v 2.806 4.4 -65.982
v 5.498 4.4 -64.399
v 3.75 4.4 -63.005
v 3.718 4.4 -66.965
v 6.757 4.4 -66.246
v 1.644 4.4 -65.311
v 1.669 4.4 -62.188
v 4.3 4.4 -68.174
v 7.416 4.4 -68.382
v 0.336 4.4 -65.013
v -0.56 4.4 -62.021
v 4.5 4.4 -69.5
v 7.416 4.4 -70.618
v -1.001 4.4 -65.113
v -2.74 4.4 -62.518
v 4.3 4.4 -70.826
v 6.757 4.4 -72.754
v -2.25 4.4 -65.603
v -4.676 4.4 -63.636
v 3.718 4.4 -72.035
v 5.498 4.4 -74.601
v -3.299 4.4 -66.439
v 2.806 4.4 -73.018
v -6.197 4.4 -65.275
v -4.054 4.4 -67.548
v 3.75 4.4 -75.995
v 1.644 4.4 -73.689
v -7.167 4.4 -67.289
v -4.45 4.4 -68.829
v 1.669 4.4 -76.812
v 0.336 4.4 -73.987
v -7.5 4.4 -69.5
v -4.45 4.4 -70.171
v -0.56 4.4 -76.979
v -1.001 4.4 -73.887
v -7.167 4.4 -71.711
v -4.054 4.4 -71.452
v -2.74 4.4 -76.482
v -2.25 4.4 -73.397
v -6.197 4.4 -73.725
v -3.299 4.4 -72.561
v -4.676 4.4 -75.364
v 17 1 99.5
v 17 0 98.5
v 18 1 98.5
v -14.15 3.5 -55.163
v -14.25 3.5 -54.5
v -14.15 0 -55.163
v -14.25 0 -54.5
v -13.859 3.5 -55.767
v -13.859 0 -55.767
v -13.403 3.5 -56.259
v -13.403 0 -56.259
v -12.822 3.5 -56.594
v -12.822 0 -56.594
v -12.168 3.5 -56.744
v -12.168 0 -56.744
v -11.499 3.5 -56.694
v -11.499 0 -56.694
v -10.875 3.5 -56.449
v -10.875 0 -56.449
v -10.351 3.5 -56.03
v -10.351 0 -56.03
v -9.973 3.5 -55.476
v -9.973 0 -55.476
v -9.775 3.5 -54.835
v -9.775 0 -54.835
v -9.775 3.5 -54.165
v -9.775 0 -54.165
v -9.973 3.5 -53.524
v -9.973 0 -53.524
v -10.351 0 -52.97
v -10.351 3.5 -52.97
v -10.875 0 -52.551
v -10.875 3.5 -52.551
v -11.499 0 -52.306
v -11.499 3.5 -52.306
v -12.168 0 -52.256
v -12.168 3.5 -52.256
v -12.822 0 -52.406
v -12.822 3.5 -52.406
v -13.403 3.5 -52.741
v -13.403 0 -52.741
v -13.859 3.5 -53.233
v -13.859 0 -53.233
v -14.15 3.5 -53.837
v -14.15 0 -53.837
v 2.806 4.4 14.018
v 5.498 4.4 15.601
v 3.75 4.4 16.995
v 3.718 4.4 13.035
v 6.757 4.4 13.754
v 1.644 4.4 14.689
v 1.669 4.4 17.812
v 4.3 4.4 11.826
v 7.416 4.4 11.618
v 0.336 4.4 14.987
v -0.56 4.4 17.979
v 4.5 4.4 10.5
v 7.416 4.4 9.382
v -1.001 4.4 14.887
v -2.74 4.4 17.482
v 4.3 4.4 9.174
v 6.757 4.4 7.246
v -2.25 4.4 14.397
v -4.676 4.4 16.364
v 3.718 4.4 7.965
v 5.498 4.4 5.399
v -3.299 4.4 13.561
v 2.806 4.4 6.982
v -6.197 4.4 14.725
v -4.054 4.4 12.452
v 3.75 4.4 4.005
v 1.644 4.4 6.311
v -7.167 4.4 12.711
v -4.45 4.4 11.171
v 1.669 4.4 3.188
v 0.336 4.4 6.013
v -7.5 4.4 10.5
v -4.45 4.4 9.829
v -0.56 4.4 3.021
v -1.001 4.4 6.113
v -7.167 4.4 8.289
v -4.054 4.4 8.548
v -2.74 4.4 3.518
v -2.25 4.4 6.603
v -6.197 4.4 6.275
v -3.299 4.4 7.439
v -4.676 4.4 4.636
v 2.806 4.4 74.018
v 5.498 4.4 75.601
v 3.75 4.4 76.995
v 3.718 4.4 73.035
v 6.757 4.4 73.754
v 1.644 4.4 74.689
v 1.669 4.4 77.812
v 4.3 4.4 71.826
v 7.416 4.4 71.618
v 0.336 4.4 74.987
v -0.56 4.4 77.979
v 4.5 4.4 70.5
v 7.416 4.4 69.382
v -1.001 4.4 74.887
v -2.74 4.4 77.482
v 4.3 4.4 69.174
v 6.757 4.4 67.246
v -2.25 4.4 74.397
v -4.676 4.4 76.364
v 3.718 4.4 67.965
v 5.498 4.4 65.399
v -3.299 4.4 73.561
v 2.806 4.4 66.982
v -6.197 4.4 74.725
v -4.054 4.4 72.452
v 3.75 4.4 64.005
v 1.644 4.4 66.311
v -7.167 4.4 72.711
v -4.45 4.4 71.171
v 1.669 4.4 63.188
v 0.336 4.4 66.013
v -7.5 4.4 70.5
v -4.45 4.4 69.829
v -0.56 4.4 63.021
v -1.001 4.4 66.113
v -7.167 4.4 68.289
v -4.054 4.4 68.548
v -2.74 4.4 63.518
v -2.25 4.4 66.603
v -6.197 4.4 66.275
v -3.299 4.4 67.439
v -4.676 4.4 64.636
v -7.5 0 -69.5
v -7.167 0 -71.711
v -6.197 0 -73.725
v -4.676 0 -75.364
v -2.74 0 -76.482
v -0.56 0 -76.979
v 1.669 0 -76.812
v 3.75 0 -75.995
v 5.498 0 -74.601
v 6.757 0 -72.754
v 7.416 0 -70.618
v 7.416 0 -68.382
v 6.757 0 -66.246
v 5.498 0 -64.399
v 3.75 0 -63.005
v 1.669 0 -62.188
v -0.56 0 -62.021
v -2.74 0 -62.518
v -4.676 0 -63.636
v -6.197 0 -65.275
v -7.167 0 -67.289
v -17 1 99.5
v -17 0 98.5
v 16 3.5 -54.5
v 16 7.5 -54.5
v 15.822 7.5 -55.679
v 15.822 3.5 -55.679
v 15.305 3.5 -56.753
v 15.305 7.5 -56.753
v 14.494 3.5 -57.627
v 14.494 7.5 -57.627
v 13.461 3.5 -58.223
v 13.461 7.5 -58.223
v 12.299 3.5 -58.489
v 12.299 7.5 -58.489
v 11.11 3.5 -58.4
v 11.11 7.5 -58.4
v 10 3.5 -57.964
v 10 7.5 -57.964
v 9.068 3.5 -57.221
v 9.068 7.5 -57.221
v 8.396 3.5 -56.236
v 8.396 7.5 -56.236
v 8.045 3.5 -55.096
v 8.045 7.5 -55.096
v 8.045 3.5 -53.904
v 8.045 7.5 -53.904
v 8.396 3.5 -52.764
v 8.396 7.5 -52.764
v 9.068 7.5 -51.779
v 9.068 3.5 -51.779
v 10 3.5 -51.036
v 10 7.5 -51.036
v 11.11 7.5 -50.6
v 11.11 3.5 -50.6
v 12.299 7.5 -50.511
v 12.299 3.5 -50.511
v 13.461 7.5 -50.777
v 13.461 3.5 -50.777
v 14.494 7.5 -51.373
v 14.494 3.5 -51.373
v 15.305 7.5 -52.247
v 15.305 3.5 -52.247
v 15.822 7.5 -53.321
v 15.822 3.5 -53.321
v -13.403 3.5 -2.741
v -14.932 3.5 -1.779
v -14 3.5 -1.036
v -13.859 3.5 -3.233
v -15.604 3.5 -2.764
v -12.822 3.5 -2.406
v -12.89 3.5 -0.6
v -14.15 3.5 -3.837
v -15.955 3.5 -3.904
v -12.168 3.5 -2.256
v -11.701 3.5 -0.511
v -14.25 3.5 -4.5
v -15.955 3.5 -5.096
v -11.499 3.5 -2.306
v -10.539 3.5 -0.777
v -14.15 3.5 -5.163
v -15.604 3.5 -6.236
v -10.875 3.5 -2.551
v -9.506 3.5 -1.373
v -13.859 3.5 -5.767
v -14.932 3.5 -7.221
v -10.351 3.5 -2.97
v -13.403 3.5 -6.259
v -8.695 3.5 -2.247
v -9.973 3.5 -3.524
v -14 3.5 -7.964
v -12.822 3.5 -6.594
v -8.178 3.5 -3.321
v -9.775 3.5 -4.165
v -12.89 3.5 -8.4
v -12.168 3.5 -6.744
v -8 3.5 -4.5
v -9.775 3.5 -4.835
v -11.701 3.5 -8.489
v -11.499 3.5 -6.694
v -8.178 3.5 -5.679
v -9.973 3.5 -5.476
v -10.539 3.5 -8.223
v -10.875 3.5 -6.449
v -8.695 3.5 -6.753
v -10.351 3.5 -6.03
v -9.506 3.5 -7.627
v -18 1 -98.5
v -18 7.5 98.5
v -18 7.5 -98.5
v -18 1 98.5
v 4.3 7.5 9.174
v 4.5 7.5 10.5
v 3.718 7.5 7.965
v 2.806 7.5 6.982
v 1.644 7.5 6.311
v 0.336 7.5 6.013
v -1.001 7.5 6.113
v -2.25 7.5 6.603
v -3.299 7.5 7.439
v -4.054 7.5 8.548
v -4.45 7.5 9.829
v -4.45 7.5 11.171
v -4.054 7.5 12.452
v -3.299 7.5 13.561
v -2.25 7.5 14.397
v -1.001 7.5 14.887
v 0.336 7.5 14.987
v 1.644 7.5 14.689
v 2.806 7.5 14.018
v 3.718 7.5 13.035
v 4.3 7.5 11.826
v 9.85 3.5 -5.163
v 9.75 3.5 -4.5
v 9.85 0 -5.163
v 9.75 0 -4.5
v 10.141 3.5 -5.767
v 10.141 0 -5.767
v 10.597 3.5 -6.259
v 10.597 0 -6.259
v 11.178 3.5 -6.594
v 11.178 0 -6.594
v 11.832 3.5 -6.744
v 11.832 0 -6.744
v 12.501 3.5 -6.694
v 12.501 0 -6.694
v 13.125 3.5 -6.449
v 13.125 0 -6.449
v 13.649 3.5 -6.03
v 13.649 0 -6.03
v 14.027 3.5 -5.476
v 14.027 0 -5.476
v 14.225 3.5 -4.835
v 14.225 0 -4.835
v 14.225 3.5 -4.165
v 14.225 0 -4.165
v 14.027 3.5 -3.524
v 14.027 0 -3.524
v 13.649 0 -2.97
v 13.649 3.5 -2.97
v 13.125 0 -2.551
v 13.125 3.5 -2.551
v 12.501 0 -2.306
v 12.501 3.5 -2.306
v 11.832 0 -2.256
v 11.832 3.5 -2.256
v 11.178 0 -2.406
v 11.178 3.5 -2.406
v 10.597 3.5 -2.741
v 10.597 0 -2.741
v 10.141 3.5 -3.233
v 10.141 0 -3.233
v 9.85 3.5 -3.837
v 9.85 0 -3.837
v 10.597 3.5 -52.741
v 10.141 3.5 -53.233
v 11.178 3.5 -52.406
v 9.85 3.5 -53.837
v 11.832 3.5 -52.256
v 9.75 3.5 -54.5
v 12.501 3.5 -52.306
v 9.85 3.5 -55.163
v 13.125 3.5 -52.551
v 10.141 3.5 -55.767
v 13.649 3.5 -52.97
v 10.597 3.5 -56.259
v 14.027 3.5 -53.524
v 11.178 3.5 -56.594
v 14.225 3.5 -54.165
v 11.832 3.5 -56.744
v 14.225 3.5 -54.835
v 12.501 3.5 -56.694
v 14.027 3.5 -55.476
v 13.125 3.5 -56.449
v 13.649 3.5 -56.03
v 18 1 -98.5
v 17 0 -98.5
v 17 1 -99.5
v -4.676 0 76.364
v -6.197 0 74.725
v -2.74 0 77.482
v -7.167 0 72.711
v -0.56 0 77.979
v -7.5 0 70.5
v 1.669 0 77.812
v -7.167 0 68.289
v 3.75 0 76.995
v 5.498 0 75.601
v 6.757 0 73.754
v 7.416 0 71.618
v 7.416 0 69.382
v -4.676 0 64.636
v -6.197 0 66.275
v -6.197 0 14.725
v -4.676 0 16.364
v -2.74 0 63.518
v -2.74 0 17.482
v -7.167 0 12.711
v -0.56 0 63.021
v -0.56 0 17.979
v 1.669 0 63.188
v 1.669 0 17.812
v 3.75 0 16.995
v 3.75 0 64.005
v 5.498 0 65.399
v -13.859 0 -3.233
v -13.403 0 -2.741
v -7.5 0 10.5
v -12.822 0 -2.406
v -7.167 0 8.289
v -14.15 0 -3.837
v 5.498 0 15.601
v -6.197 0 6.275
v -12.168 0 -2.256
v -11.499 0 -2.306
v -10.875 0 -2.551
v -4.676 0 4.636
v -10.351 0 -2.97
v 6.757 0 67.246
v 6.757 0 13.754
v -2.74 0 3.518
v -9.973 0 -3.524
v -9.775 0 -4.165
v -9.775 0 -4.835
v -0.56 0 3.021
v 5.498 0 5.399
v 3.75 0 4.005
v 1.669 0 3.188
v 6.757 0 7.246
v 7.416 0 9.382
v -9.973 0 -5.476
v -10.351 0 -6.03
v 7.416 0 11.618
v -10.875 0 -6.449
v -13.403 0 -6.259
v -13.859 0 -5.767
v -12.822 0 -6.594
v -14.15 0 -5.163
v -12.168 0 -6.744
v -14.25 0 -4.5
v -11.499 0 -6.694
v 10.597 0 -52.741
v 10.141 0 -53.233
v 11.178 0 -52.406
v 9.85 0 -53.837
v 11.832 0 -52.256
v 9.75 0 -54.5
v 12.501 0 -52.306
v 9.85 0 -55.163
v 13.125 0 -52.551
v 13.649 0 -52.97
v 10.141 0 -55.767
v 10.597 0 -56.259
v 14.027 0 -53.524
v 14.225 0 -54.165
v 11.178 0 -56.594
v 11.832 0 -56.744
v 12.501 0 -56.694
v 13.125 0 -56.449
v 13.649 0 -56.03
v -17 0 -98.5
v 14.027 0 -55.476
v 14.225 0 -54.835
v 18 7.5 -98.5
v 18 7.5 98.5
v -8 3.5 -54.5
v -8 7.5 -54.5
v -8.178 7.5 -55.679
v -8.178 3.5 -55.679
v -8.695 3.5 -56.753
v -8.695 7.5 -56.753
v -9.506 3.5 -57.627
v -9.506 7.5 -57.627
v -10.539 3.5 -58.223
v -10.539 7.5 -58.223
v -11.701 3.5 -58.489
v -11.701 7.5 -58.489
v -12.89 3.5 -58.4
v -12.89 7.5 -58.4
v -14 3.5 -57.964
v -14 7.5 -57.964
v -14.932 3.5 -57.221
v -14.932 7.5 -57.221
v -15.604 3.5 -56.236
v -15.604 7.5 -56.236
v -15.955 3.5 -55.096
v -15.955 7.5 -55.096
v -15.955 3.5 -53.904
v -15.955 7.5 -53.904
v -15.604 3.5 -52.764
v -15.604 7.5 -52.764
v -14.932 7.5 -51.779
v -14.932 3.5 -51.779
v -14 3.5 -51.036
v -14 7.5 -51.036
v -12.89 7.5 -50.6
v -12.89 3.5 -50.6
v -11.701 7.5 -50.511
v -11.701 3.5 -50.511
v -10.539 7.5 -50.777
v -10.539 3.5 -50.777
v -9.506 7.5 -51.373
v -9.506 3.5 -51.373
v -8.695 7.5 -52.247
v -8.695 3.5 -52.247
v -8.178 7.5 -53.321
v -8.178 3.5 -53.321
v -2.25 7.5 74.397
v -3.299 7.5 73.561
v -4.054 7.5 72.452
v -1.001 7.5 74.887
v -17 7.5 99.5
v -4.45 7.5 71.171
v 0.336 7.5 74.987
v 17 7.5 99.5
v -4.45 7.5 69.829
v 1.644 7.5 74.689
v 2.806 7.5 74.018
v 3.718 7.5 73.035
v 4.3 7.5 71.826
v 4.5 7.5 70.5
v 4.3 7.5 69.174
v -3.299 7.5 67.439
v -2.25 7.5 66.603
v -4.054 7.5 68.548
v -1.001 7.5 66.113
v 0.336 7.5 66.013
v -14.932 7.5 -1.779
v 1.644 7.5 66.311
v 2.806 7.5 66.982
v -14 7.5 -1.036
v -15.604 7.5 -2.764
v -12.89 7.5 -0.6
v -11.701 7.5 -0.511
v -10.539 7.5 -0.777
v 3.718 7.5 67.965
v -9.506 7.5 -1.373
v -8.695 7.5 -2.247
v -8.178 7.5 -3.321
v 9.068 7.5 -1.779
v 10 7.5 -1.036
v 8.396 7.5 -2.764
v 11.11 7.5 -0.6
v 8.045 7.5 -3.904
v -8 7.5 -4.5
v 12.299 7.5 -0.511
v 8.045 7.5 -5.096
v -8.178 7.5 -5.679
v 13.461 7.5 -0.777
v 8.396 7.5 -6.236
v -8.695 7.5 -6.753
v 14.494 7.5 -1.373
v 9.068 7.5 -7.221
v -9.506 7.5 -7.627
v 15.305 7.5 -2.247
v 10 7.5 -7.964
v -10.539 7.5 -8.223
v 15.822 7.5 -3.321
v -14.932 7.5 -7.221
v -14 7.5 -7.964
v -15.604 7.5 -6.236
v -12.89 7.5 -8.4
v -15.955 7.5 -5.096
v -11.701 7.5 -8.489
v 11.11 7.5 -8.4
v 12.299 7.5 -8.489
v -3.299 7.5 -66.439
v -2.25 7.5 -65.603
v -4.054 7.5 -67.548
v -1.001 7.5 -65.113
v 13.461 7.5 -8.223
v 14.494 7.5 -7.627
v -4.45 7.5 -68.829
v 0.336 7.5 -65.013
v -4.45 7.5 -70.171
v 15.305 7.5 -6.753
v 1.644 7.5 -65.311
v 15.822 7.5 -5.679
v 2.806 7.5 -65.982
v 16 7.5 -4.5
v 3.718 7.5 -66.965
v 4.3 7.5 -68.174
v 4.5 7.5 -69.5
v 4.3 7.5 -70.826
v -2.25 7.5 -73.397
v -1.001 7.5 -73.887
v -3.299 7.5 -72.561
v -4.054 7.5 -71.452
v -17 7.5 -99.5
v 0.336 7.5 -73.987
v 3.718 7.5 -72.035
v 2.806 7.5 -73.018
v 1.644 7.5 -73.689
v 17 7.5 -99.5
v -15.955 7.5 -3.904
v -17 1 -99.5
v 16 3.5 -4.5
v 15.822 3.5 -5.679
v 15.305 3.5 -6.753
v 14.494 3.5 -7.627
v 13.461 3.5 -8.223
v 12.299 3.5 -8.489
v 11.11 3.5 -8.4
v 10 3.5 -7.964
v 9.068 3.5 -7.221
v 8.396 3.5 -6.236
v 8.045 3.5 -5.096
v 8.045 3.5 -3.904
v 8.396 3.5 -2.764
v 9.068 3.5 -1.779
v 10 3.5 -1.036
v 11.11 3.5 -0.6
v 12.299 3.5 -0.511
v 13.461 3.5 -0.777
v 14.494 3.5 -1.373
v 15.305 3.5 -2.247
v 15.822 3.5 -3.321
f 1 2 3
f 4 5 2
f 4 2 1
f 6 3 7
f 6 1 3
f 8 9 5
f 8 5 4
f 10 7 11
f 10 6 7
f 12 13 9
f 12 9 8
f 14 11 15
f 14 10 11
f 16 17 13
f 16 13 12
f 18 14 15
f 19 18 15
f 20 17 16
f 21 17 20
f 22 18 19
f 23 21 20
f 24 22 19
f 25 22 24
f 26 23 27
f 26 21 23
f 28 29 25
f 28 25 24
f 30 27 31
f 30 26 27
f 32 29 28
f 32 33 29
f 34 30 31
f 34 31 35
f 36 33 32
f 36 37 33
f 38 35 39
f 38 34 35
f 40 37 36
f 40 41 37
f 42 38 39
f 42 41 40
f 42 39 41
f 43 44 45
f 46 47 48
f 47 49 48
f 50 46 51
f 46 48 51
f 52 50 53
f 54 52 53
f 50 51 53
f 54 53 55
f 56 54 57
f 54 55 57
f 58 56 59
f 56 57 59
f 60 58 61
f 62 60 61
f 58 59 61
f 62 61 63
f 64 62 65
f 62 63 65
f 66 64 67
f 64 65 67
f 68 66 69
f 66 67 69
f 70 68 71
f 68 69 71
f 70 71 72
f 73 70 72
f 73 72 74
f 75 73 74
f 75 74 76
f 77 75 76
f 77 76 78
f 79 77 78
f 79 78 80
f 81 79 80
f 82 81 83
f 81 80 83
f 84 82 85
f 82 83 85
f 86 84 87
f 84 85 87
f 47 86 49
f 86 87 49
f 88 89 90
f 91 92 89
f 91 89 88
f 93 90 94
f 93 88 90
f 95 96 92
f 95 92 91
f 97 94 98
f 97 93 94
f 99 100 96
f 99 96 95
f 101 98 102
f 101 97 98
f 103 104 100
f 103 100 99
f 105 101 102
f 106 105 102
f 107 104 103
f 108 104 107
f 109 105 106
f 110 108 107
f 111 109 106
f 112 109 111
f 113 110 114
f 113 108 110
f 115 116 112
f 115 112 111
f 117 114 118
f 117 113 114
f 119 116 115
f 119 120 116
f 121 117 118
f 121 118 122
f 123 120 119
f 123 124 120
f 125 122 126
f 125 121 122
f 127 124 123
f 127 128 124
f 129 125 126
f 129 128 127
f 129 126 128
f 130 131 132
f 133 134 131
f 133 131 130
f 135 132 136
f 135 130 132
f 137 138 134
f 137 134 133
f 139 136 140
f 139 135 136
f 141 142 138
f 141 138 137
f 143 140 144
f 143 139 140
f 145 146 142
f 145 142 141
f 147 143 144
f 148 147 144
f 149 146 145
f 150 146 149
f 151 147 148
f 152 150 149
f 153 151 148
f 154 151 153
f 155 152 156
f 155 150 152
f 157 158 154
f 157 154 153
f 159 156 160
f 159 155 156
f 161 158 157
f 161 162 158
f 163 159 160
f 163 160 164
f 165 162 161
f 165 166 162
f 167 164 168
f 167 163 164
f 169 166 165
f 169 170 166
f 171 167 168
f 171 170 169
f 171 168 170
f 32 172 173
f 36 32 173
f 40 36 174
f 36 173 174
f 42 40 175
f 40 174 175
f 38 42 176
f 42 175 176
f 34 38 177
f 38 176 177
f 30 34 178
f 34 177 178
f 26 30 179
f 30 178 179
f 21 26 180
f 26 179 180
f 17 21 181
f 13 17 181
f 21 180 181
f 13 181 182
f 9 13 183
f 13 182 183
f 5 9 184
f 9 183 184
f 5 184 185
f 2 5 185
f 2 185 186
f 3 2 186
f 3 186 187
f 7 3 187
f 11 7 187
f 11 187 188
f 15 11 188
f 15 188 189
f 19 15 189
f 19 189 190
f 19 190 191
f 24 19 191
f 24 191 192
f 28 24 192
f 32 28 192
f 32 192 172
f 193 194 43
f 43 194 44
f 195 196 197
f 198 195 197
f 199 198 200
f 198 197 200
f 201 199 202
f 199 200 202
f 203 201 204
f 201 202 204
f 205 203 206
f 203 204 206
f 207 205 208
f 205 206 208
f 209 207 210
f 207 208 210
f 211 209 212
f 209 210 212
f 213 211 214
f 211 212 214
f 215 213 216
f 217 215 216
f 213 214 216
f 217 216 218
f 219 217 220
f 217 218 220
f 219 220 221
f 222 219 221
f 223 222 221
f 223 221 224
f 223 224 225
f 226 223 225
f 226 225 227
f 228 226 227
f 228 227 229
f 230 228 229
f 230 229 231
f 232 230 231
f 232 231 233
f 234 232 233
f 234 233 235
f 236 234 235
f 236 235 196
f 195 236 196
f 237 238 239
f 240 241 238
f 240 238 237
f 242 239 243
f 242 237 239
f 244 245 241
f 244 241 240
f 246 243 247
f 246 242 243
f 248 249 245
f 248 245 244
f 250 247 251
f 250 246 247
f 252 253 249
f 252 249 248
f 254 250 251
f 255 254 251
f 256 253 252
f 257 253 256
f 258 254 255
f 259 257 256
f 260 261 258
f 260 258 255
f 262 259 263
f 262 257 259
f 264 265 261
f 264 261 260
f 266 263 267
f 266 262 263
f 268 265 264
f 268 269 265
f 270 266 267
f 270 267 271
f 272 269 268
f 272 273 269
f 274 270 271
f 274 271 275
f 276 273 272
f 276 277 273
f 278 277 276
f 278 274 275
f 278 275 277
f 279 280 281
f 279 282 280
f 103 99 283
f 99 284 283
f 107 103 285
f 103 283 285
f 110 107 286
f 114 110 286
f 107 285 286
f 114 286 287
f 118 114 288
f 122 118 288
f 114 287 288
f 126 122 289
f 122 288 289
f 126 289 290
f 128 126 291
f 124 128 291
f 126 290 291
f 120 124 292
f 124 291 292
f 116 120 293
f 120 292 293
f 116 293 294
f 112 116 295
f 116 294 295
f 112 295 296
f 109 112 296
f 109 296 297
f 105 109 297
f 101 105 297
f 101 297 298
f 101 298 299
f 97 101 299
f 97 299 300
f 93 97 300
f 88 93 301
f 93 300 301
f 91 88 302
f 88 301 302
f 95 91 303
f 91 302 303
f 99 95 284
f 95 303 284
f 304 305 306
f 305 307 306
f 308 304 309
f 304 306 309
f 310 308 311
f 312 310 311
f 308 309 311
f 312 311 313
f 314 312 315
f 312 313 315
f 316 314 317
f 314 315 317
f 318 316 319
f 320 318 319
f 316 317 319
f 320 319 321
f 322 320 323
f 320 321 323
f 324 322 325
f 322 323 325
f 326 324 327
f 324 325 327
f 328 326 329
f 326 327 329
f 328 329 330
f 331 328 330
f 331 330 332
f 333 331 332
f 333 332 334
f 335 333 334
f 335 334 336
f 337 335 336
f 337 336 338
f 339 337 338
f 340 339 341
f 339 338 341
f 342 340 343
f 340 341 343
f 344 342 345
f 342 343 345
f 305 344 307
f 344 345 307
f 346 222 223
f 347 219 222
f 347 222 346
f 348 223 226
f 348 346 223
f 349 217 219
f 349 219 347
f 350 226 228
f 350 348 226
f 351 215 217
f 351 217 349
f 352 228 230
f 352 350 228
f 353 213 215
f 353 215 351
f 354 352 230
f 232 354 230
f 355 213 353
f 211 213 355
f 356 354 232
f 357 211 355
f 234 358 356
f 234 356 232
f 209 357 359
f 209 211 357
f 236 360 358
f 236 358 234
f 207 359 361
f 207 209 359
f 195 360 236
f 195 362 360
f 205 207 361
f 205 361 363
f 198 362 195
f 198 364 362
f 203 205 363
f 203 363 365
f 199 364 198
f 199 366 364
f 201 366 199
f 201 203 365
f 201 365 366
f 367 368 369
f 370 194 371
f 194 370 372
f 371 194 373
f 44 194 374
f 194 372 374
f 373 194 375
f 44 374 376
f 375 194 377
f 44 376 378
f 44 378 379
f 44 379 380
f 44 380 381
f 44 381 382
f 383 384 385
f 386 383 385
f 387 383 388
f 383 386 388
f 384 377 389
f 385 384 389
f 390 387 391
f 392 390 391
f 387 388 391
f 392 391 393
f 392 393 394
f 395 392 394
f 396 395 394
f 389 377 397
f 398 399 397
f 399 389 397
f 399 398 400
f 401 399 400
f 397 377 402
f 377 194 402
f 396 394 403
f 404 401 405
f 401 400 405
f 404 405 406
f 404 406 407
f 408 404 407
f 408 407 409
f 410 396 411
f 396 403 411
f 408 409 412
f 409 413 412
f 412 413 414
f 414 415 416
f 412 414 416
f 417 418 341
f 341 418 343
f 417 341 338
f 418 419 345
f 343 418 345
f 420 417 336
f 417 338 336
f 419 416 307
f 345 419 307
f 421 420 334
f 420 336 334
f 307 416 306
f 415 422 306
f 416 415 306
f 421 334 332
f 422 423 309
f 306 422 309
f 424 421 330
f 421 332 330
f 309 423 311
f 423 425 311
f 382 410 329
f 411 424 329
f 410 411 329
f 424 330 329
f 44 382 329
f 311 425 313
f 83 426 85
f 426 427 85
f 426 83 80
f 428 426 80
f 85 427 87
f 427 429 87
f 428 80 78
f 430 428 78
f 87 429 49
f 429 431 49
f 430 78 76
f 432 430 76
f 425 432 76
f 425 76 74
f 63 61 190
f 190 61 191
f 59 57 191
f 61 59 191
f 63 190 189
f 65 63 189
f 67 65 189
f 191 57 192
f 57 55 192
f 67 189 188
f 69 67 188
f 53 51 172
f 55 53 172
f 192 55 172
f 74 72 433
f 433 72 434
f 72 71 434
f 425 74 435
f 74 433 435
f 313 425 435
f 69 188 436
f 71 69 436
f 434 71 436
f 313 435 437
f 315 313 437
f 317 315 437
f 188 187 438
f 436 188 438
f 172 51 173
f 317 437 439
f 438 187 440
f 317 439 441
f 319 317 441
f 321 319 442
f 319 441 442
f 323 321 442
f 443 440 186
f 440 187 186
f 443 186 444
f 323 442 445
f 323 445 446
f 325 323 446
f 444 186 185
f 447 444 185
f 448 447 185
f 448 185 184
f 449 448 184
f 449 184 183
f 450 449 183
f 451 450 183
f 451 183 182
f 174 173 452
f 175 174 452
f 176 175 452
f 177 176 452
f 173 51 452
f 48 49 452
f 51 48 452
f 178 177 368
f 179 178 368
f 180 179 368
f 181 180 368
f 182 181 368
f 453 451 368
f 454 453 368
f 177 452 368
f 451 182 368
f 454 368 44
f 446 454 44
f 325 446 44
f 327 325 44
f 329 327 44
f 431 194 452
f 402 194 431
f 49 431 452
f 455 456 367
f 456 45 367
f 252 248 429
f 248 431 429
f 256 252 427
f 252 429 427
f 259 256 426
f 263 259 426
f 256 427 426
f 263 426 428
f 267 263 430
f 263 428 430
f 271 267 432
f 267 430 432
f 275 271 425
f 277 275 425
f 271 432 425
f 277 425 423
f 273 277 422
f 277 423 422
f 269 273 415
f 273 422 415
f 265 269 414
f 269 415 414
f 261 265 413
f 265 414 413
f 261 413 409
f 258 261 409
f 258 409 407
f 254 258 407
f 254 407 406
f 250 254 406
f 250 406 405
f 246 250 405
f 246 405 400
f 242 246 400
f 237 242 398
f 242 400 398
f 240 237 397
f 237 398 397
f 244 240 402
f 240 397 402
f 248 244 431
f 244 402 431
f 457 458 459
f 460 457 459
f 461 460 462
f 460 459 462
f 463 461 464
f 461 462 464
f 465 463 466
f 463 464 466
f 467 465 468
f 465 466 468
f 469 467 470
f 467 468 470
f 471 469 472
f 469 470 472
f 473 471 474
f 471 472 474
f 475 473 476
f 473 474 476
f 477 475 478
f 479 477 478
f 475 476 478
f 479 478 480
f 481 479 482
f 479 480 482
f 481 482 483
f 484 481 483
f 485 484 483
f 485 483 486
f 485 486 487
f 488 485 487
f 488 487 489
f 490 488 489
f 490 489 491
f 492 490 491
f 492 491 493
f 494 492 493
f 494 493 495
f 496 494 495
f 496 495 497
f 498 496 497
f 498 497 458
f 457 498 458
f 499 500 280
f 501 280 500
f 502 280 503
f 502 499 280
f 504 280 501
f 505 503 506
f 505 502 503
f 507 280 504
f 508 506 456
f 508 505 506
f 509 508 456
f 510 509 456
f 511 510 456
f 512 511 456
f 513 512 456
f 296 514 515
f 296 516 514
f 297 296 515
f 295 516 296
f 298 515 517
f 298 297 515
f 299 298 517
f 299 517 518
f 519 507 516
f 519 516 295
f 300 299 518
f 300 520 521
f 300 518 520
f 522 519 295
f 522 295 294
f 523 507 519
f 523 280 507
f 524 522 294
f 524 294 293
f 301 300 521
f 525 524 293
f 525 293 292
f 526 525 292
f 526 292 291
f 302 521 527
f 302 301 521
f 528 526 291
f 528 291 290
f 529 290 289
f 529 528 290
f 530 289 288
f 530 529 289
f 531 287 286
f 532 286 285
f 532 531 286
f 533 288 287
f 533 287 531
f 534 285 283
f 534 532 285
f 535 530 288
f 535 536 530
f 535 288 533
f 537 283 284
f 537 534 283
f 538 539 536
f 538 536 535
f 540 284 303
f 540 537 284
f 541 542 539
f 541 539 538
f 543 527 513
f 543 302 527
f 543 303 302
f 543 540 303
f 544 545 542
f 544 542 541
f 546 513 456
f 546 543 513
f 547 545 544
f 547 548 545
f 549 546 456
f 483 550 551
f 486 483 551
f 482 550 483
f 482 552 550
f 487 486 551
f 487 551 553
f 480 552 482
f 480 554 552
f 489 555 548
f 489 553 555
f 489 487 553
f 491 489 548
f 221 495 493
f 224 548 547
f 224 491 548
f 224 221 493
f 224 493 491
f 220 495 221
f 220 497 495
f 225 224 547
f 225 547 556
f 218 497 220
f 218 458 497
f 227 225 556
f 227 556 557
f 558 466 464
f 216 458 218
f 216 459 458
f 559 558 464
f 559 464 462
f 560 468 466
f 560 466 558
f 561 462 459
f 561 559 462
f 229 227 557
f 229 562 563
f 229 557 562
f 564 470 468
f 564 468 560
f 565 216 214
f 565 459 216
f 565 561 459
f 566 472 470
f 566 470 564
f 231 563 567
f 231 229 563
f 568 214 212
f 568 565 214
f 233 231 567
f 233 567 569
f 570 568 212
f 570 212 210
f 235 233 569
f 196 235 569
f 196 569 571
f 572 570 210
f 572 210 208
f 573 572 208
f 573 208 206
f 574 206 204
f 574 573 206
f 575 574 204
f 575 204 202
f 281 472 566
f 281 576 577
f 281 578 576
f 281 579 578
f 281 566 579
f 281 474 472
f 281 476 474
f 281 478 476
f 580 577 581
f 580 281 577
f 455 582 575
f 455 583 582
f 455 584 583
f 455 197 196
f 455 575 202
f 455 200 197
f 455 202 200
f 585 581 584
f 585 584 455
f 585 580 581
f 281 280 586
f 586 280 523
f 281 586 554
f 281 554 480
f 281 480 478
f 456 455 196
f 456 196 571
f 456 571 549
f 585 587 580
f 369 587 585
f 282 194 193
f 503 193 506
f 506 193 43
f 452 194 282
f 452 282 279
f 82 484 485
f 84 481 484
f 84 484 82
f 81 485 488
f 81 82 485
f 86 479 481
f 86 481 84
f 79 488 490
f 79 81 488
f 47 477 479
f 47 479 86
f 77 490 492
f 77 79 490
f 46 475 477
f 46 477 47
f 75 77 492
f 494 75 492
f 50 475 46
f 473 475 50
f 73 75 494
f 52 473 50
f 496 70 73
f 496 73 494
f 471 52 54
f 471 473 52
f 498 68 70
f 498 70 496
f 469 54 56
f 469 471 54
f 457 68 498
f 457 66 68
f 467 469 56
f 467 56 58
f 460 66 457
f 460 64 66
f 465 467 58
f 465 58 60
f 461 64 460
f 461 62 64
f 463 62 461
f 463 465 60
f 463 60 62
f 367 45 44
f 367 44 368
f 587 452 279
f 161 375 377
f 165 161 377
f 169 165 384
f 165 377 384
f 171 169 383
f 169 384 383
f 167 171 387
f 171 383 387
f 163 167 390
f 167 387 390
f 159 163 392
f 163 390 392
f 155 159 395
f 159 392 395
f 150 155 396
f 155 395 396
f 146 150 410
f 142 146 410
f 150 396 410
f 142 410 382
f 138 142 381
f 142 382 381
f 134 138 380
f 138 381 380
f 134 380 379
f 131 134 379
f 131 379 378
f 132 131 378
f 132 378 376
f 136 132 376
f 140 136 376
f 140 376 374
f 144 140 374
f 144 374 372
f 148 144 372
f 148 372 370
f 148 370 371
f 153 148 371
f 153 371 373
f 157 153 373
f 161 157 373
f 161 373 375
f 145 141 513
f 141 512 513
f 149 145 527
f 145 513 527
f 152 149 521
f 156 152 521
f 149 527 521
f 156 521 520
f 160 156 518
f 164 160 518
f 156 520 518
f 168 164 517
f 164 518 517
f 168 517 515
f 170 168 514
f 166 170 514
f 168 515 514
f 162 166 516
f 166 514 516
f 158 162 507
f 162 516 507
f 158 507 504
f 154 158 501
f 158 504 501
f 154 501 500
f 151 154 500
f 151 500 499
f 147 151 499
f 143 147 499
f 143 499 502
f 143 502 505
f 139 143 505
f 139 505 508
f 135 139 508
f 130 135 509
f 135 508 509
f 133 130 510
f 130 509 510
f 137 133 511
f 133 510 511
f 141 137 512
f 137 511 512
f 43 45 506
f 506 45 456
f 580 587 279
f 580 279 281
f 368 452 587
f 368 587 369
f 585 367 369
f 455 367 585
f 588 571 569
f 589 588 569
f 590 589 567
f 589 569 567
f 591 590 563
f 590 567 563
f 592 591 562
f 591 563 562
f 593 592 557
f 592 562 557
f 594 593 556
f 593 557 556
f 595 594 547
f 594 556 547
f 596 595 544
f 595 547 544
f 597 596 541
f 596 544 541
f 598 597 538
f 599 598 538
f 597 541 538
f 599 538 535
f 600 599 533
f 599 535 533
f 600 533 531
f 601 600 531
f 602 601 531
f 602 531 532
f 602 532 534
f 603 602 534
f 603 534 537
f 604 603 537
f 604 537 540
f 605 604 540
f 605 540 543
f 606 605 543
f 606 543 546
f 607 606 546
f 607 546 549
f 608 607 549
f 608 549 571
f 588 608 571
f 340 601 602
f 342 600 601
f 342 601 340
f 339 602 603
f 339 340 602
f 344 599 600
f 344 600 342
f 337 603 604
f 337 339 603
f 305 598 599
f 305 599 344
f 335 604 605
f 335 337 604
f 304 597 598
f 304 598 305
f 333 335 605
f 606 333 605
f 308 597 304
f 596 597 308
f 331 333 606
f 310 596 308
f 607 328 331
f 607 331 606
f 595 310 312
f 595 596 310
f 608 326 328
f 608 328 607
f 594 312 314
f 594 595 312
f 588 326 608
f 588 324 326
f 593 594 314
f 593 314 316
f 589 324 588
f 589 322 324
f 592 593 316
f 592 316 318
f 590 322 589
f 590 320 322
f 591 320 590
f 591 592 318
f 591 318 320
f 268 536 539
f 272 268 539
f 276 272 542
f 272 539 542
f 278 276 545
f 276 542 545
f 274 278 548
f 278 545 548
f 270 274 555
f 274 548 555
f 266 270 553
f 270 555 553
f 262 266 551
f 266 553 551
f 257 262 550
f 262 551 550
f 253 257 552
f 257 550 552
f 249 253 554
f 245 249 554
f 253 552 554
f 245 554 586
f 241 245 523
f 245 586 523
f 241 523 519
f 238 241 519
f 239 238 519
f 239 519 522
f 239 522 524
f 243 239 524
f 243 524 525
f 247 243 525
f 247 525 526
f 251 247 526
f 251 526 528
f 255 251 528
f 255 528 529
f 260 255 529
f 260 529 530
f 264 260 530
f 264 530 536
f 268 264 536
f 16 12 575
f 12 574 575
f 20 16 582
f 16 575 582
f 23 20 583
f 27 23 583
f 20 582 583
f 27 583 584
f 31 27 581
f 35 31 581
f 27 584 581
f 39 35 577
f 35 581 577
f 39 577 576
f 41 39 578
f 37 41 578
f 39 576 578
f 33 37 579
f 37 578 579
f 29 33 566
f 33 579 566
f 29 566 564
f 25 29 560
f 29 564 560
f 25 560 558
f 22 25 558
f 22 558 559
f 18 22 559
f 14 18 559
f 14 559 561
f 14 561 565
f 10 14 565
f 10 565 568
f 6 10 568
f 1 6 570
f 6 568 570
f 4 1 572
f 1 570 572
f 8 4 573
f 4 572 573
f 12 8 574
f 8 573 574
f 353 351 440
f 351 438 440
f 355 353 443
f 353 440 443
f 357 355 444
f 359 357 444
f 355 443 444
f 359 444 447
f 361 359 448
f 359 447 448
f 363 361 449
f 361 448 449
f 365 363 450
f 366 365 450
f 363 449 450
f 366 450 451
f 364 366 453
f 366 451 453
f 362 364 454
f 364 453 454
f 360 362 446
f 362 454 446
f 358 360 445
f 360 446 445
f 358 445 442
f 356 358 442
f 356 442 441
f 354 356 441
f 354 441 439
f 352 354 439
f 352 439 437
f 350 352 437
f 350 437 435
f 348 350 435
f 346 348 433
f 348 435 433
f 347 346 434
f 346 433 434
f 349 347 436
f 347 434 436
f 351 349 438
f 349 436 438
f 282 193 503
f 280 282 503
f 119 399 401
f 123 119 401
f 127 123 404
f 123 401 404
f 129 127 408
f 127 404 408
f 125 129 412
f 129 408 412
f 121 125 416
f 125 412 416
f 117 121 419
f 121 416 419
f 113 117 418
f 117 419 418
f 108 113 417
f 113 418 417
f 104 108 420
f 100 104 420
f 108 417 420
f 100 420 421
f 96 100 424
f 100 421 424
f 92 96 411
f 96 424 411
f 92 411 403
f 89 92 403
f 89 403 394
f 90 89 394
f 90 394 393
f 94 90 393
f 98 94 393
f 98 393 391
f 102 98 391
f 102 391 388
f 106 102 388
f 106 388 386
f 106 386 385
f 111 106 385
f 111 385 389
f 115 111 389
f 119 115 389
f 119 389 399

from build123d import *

# Parameters (mm, degrees)
SKETCH1_W                       = 36
SKETCH1_H                       = 199
BOSS_EXTRUDE1_DEPTH             = 7.5
CBORE_FOR_M4_SHCS1_D            = 4.5
CBORE_FOR_M4_SHCS1_CBORE_D      = 8
CBORE_FOR_M4_SHCS1_CBORE_DEPTH  = 4
CHAMFER1_SIZE                   = 1
CBORE_FOR_M8_SBHCS1_D           = 9
CBORE_FOR_M8_SBHCS1_CBORE_D     = 15
CBORE_FOR_M8_SBHCS1_CBORE_DEPTH = 4.4


with BuildPart() as part:
    # Sketch1 → Boss-Extrude1 (new body)
    with BuildSketch(Plane(origin=(0, 0, 0), x_dir=(1, 0, 0), z_dir=(0, 1, 0))):
        Rectangle(SKETCH1_W, SKETCH1_H)
    extrude(amount=BOSS_EXTRUDE1_DEPTH)

    # CBORE for M4 SHCS1 (through all)
    with Locations(Plane(origin=(0, 7.5, 0), x_dir=(1, 0, 0), z_dir=(0, 1, 0))):
        with Locations((-12, 54.5), (12, 54.5), (12, 4.5), (-12, 4.5)):
            CounterBoreHole(CBORE_FOR_M4_SHCS1_D / 2, CBORE_FOR_M4_SHCS1_CBORE_D / 2, CBORE_FOR_M4_SHCS1_CBORE_DEPTH)

    # Chamfer1
    chamfer1_edges = [part.edges().sort_by_distance(p)[0] for p in [
        (0, 0, 99.5),
        (-18, 0, 0),
        (0, 0, -99.5),
        (18, 0, 0),
        (18, 3.75, 99.5),
        (-18, 3.75, 99.5),
        (-18, 3.75, -99.5),
        (18, 3.75, -99.5),
    ]]
    chamfer(chamfer1_edges, length=CHAMFER1_SIZE)

    # CBORE for M8 SBHCS1 (through all)
    with Locations(Plane(origin=(0, 0, 0), x_dir=(-1, 0, 0), z_dir=(0, -1, 0))):
        with Locations((0, 69.5), (0, -10.5), (0, -70.5)):
            CounterBoreHole(CBORE_FOR_M8_SBHCS1_D / 2, CBORE_FOR_M8_SBHCS1_CBORE_D / 2, CBORE_FOR_M8_SBHCS1_CBORE_DEPTH)


solid = part.part
